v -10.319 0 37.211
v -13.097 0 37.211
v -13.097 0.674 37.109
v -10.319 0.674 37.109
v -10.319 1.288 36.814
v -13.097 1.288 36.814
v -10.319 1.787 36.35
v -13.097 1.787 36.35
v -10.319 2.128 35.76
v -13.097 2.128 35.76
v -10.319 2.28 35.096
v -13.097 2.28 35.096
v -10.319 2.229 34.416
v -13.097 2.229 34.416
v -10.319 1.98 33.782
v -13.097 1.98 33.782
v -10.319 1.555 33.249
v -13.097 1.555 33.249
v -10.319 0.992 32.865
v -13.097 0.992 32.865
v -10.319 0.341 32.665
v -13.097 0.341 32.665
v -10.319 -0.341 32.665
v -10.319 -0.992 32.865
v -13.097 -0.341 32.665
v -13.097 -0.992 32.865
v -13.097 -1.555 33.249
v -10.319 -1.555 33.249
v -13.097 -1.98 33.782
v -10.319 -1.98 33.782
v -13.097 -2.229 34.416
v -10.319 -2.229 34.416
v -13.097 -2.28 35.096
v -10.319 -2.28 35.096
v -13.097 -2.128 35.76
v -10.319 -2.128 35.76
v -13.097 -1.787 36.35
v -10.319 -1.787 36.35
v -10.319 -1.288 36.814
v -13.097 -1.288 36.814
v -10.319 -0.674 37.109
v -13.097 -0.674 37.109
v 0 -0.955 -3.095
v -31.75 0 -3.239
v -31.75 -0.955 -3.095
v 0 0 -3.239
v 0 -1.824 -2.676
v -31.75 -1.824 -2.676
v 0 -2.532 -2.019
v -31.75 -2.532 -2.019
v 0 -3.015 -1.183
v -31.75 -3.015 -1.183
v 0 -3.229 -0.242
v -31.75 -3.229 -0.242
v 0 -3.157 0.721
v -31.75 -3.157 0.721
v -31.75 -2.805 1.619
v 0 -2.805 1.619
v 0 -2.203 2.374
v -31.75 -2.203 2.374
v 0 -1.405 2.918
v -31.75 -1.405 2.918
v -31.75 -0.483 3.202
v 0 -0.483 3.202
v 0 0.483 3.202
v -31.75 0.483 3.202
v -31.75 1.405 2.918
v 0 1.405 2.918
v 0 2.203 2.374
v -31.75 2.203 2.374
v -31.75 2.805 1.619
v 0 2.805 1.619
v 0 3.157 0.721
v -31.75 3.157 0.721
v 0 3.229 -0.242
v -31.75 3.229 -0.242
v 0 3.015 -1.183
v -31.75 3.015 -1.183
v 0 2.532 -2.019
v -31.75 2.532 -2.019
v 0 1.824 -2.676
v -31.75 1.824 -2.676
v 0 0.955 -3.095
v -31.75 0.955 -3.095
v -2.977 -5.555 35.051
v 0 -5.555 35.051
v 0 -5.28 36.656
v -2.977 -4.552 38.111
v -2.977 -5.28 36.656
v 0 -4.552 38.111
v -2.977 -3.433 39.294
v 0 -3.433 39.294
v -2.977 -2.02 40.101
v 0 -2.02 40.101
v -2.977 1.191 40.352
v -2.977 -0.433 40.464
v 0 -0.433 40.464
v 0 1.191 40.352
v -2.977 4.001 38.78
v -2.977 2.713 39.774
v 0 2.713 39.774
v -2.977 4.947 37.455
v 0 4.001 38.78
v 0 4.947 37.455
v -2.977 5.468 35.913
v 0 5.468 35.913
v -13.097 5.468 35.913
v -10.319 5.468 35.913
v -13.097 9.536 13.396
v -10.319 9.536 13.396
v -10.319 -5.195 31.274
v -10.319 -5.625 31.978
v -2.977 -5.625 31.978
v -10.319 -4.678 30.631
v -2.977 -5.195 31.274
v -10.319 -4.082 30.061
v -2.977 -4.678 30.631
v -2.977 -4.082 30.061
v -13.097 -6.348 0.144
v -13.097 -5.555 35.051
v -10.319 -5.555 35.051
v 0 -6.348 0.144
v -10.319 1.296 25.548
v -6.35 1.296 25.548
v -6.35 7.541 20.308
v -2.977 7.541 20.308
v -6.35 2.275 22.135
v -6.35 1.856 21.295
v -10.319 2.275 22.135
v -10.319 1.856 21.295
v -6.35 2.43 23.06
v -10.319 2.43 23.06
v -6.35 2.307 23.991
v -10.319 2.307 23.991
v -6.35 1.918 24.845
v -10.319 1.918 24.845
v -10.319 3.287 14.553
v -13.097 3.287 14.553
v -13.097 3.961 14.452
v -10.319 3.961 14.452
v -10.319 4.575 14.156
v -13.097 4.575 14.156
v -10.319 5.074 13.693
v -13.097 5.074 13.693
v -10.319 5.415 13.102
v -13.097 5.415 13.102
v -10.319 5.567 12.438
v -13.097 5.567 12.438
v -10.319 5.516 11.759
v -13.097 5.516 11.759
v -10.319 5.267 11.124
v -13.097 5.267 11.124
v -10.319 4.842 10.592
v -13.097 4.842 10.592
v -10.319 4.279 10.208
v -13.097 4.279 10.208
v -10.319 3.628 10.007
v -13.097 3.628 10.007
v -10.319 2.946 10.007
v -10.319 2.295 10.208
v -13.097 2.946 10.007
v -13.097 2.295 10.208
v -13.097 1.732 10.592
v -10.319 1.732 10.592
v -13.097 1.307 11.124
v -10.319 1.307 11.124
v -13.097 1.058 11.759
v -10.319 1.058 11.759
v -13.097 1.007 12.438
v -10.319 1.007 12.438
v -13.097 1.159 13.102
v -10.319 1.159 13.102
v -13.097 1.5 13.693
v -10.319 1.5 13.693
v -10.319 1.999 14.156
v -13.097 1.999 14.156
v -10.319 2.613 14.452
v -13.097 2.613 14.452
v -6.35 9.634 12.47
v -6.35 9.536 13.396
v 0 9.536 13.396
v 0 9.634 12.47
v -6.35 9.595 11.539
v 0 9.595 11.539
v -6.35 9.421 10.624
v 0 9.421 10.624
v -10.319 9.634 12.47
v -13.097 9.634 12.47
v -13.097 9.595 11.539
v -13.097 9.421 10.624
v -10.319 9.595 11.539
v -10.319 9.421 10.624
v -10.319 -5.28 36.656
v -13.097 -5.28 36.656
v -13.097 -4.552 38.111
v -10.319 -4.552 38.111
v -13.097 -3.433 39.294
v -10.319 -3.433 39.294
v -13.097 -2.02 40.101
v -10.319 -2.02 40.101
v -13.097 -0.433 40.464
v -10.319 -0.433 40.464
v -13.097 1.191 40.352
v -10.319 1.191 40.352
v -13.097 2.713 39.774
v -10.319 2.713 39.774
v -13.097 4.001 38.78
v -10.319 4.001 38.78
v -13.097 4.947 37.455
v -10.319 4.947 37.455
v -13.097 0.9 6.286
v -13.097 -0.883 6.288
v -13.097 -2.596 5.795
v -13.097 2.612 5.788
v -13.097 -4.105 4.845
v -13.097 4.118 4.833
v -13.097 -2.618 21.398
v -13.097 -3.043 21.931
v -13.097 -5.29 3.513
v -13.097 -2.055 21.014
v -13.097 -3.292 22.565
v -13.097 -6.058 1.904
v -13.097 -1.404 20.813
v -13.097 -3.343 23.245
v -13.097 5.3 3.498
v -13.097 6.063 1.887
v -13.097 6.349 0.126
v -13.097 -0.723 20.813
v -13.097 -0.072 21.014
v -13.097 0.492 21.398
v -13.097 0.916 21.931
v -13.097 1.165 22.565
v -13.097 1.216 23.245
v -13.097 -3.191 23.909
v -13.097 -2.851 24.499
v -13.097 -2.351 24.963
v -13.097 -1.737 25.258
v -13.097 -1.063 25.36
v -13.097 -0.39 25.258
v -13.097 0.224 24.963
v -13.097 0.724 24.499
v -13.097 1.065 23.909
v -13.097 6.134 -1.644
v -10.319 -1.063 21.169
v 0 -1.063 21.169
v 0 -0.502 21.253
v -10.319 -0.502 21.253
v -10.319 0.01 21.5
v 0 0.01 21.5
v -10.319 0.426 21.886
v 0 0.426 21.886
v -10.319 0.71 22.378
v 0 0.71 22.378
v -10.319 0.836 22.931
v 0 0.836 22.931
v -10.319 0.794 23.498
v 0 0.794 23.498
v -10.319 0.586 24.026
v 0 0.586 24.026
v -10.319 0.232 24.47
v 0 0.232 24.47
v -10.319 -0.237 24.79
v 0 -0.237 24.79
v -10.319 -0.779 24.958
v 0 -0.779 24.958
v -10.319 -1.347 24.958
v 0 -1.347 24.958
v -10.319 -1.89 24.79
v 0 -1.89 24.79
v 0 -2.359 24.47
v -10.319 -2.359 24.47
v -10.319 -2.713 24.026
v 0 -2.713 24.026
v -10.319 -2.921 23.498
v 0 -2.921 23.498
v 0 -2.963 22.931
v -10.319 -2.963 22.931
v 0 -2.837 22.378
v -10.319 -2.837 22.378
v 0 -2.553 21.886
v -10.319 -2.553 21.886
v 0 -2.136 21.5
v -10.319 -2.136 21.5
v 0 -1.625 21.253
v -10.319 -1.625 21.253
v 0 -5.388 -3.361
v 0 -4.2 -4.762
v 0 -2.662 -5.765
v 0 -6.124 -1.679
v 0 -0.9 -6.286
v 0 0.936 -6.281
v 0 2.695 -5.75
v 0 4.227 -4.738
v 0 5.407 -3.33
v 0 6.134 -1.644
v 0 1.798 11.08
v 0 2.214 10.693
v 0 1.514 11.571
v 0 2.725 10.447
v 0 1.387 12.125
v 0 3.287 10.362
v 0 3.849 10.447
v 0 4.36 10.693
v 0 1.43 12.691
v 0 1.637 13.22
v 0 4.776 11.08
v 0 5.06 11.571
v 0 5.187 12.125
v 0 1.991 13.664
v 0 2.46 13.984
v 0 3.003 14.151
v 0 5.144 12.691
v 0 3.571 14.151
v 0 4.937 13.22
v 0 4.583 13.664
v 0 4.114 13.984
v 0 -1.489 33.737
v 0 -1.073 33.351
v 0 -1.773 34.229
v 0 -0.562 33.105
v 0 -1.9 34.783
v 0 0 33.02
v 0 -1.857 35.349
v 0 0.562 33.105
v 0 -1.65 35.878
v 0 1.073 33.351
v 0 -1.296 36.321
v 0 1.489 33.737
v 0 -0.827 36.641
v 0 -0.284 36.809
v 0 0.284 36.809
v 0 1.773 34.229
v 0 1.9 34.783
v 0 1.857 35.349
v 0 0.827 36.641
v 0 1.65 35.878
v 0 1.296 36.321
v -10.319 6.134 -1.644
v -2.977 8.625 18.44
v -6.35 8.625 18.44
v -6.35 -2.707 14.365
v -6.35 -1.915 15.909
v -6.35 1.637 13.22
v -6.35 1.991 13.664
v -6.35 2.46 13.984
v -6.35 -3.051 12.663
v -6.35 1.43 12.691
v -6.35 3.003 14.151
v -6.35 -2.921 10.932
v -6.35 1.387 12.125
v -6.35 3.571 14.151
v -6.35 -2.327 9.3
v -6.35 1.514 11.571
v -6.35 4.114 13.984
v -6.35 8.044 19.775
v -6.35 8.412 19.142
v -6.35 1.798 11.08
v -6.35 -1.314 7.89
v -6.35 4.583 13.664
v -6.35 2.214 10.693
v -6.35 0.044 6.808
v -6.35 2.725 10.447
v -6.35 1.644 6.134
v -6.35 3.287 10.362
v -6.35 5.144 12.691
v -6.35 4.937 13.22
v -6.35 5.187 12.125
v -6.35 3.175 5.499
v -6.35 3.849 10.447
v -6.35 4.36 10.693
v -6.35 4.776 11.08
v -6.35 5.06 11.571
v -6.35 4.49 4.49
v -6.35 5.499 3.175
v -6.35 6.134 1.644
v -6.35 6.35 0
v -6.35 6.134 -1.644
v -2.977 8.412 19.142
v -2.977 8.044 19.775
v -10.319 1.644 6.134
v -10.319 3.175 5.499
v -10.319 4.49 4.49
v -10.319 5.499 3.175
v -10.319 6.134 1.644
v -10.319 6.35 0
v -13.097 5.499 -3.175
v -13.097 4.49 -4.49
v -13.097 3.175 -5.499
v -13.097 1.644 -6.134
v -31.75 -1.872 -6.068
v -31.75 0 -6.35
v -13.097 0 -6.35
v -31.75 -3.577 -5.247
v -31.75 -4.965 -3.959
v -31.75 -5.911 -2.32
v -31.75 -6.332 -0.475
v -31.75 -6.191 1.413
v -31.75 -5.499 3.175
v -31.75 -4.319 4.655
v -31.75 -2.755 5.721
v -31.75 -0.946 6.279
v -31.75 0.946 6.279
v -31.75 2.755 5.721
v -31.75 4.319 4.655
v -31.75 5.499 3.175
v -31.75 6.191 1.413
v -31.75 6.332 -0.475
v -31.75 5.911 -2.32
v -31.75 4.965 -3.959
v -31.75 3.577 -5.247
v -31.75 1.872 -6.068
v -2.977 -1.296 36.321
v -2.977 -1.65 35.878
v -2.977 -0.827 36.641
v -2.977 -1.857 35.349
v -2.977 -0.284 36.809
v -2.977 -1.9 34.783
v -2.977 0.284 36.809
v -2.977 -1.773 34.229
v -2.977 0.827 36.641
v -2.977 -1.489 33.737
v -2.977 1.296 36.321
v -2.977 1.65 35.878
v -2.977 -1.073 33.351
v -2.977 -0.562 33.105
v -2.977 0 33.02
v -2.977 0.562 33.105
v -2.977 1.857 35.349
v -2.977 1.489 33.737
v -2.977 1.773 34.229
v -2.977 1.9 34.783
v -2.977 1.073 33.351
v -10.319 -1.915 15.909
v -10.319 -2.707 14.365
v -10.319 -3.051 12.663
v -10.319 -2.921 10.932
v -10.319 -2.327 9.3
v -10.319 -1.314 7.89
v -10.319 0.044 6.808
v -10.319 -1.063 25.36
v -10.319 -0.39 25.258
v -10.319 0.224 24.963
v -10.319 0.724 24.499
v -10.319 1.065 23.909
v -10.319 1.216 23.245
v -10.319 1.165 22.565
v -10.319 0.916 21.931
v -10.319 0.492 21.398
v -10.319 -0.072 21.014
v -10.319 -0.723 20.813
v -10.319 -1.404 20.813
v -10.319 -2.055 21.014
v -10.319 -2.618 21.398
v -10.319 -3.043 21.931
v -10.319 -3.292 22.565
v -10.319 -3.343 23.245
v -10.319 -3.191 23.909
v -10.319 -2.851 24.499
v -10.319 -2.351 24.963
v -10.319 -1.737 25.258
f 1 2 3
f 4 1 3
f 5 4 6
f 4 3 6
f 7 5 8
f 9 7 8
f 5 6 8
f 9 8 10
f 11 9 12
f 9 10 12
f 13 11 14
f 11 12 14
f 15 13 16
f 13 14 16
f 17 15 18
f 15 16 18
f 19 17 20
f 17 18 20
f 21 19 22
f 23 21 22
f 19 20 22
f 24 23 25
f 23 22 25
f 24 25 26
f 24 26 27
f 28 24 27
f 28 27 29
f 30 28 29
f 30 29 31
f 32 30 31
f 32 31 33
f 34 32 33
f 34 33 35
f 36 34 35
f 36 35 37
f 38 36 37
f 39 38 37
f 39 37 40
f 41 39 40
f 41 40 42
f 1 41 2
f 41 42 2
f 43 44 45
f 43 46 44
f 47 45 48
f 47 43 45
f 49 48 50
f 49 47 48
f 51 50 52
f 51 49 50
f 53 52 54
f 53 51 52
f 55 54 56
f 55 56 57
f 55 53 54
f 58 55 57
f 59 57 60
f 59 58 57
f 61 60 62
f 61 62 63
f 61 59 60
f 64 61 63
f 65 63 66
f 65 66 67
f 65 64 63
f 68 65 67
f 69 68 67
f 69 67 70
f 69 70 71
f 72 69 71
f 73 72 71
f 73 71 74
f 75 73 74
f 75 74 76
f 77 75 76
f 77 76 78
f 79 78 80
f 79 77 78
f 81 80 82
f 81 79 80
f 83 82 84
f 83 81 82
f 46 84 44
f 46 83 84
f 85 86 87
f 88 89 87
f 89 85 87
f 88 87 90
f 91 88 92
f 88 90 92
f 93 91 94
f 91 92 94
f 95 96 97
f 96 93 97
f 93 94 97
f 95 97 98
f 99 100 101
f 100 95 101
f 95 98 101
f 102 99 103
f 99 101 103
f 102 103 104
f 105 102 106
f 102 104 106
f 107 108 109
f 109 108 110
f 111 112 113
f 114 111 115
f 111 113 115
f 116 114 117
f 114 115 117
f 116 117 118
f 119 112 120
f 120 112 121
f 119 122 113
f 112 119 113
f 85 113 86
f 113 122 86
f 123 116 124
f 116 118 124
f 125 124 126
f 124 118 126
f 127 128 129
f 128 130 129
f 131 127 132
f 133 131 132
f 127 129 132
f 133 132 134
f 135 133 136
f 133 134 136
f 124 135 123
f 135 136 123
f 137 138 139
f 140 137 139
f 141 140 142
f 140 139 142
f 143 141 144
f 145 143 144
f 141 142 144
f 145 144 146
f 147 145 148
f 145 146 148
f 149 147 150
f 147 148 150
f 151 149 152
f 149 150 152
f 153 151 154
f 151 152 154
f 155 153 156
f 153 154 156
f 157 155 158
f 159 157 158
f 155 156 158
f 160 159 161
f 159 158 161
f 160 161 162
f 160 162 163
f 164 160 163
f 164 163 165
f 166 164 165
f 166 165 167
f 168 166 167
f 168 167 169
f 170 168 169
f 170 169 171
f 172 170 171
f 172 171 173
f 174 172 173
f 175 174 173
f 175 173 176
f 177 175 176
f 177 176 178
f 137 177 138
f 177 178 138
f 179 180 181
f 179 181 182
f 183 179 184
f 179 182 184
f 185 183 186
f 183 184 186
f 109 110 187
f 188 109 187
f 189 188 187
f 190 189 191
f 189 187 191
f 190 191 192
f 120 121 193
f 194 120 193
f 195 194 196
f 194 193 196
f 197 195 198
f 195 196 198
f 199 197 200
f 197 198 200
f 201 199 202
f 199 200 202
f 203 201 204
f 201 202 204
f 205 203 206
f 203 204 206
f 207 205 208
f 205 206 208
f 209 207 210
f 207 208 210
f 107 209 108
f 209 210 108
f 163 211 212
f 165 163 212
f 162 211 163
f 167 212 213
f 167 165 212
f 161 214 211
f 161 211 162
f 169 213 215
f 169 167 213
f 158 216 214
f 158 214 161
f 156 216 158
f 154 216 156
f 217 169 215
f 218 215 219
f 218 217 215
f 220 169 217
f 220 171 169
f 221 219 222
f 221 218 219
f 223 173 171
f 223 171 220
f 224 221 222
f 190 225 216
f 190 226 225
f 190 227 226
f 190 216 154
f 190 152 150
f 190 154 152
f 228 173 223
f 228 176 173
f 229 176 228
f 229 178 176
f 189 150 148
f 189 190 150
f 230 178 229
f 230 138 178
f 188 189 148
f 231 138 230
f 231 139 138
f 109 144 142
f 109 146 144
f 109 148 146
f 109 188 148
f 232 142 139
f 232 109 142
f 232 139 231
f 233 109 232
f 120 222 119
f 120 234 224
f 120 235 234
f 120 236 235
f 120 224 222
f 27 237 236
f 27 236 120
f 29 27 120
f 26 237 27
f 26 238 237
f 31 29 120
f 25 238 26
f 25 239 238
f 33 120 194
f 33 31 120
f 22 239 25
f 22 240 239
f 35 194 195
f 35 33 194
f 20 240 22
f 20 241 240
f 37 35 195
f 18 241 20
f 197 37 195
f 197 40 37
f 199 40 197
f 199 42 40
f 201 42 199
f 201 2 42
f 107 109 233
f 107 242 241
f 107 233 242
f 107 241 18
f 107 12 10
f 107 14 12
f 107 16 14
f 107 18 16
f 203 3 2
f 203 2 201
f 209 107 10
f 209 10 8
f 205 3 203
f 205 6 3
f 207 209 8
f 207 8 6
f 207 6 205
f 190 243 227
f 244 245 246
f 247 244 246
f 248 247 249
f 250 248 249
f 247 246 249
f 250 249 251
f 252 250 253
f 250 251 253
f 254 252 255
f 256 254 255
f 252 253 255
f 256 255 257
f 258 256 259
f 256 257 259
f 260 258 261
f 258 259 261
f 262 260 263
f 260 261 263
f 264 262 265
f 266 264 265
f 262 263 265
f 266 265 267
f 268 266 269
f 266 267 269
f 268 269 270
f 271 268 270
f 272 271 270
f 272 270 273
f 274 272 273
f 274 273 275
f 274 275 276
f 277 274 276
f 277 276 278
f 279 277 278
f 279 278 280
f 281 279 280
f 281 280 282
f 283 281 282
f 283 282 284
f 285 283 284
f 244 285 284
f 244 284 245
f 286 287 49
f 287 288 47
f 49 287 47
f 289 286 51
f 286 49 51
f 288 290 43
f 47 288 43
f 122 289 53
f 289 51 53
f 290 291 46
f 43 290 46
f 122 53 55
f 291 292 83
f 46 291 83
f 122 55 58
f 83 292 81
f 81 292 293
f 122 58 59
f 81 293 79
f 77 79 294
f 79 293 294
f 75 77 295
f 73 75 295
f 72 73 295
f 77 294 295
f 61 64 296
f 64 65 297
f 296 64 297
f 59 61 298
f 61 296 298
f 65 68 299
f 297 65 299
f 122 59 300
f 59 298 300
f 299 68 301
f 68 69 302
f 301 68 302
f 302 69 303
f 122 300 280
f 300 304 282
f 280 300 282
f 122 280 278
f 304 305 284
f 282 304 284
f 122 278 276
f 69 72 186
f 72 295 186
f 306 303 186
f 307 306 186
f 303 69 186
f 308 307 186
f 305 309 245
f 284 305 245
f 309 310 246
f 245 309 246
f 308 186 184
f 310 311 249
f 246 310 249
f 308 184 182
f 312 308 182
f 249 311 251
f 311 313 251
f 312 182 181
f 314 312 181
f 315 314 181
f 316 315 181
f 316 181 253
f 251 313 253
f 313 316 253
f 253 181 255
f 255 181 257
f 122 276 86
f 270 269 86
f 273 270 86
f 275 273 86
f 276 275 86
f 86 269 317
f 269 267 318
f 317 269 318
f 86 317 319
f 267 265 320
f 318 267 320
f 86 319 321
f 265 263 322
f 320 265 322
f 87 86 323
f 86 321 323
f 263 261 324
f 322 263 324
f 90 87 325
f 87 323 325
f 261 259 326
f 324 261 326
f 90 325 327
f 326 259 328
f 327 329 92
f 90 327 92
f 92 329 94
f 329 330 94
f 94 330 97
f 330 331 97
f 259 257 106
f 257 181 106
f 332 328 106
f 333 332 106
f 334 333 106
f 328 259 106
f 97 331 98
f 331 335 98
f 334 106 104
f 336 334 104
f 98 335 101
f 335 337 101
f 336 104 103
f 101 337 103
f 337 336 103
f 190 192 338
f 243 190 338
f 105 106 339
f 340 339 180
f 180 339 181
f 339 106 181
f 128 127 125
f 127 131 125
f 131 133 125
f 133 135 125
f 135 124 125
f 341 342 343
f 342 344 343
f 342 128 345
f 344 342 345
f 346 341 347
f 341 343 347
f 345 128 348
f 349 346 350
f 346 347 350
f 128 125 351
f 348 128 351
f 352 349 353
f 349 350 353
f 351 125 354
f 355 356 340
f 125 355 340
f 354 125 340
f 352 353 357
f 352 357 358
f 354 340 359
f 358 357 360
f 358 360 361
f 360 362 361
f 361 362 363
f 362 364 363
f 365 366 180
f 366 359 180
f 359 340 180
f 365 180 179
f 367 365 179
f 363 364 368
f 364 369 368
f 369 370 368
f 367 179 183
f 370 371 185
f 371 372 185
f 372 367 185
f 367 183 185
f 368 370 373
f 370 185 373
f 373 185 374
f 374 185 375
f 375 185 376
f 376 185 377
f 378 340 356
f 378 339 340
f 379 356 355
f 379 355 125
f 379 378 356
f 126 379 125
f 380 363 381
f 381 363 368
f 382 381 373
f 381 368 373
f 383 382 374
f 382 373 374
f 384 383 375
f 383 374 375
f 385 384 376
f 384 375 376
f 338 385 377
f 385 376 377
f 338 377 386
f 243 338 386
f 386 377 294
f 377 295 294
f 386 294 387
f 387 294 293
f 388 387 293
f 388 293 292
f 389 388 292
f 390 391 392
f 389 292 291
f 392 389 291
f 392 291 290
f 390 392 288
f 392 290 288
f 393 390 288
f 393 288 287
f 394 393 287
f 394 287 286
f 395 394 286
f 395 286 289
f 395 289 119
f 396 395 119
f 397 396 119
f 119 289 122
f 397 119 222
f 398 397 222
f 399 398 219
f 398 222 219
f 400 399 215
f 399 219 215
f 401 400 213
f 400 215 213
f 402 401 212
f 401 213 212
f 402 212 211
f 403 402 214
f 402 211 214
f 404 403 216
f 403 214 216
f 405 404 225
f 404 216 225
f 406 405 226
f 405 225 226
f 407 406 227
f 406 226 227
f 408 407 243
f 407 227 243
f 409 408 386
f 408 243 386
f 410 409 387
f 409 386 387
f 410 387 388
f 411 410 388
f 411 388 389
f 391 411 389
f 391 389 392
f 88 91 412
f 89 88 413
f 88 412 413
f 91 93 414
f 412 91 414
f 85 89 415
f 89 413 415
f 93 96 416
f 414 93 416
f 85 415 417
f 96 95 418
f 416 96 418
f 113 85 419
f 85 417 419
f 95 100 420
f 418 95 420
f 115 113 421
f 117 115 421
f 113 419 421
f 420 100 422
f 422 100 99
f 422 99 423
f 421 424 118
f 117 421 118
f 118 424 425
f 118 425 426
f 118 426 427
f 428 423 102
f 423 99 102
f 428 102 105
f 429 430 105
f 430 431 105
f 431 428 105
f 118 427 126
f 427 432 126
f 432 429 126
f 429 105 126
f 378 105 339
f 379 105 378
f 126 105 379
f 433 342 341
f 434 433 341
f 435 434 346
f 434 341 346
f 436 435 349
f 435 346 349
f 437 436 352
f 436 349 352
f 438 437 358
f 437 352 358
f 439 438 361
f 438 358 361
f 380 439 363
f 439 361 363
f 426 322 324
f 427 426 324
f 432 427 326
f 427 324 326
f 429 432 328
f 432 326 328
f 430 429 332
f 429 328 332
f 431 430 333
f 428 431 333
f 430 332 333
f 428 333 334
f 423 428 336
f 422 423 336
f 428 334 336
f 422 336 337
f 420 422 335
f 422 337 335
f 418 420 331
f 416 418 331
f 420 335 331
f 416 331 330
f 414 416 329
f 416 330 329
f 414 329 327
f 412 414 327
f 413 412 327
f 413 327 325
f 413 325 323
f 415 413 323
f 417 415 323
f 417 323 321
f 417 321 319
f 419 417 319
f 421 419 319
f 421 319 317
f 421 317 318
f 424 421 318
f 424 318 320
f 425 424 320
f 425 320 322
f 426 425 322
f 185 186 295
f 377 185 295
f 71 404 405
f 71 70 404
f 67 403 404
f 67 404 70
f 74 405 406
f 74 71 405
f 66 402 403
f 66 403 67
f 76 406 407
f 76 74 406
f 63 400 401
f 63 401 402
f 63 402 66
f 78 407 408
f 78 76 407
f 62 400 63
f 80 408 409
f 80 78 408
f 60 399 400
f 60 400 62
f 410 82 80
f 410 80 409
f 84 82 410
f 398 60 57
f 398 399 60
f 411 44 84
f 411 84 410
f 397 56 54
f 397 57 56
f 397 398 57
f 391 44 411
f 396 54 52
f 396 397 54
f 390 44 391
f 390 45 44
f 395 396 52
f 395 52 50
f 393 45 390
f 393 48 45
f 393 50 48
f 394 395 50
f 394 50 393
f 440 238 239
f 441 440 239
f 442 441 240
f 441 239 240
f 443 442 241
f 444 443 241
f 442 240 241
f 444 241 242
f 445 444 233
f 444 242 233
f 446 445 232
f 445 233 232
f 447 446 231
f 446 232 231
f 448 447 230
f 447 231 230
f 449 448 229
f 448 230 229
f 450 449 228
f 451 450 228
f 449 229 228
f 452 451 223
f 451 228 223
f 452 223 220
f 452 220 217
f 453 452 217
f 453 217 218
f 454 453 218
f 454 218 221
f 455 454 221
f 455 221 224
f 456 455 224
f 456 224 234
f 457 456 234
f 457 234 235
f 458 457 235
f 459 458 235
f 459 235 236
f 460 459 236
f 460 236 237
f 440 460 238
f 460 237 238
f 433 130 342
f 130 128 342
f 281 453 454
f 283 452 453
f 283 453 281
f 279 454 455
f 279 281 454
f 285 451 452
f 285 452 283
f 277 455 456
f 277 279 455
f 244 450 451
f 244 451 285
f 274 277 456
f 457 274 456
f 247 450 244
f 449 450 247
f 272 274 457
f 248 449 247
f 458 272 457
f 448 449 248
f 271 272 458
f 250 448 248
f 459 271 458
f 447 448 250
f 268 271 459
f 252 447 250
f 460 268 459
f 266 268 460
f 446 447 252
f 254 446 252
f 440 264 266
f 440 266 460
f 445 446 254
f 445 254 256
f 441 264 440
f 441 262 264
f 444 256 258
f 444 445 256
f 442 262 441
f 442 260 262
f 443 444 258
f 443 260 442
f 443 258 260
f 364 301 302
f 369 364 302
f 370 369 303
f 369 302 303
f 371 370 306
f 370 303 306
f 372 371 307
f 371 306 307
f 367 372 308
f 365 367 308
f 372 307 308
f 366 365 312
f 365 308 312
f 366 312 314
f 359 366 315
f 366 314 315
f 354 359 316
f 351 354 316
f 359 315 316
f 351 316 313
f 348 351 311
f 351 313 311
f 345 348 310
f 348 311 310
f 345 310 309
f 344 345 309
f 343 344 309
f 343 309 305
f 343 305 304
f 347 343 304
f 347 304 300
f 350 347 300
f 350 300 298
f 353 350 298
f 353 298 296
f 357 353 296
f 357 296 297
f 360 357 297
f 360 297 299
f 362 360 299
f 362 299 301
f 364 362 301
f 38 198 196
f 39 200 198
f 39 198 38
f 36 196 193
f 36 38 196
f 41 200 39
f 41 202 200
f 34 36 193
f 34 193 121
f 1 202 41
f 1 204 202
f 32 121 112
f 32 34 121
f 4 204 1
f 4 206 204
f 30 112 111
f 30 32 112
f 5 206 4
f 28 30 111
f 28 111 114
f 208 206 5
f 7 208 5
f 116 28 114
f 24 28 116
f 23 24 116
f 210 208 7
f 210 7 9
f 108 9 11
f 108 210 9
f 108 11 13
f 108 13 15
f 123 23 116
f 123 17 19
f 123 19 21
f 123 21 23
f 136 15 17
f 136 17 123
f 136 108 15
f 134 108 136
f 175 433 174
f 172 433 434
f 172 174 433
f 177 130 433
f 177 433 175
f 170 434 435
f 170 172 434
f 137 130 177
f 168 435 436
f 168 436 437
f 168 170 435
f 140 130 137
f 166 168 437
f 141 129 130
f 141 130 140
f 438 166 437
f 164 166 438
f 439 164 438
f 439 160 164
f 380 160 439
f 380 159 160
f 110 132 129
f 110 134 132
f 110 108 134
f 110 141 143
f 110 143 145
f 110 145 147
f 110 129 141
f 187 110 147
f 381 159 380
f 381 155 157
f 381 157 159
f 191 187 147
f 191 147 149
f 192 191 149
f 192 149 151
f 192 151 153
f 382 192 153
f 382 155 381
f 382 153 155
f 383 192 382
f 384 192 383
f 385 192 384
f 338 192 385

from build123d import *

# Parameters (mm, degrees)
BOSS_EXTRUDE1_DEPTH = 13.096874999999999
CUT_EXTRUDE4_START  = -6.35
CUT_EXTRUDE4_DEPTH  = 3.96875
CUT_EXTRUDE6_DEPTH  = 3.571875
SKETCH3_R           = 3.2385000000000006
SKETCH3_R_2         = 1.9049999999999998
SKETCH3_R_3         = 1.905
SKETCH3_R_4         = 1.9050000000000002
CUT_EXTRUDE2_DEPTH  = 44.62489589012807
SKETCH4_R           = 6.349999999999998
SKETCH4_R_2         = 3.2385000000000006
BOSS_EXTRUDE2_DEPTH = 18.653125
SKETCH5_R           = 2.286
SKETCH5_R_2         = 2.285999999999998
SKETCH5_R_3         = 2.2859999999999947
CUT_EXTRUDE5_DEPTH  = 2.778125
FILLET1_R           = 3.175


with BuildPart() as part:
    # Sketch1 → Boss-Extrude1 (new body)
    with BuildSketch(Plane(origin=(0, 0, 0), x_dir=(0, 0, -1), z_dir=(1, 0, 0))):
        with BuildLine():
            Line((-0.144318181818181, -6.348359808832252), (-35.051278409090905, -5.55481483272822))
            ThreePointArc((-35.051278409090905, -5.55481483272822), (-40.46435346310375, -0.4329864585648121), (-35.912861193635386, 5.467727528380438))
            Line((-35.912861193635386, 5.467727528380438), (-13.396242215168781, 9.535833333808146))
            ThreePointArc((-13.396242215168781, 9.535833333808146), (-12.00362991406523, 9.631527090305429), (-10.623757057470224, 9.420630869737527))
            Line((-10.623757057470224, 9.420630869737527), (1.643500936400966, 6.133628996935595))
            ThreePointArc((1.643500936400966, 6.133628996935595), (6.285849057186948, -0.9003341769931446), (-0.144318181818181, -6.348359808832252))
        make_face()
    extrude(amount=-BOSS_EXTRUDE1_DEPTH)

    # Sketch6 → Cut-Extrude4 (cut)
    with BuildSketch(Plane(origin=(0, 0, 0), x_dir=(0, 0, -1), z_dir=(1, 0, 0)).offset(CUT_EXTRUDE4_START)):
        with BuildLine():
            Line((1.643500936400966, 6.133628996935595), (-10.623757057470224, 9.420630869737526))
            ThreePointArc((-10.623757057470224, 9.420630869737526), (-12.00362991406523, 9.63152709030543), (-13.396242215168781, 9.535833333808146))
            Line((-13.396242215168781, 9.535833333808146), (-35.912861193635386, 5.467727528380437))
            ThreePointArc((-35.912861193635386, 5.467727528380437), (-40.46435346310375, -0.4329864585648108), (-35.051278409090905, -5.55481483272822))
            Line((-35.051278409090905, -5.55481483272822), (-31.977891932173424, -5.6246825720703155))
            ThreePointArc((-31.977891932173424, -5.6246825720703155), (-30.943788765977928, -4.9469644338822985), (-30.060617786194513, -4.081701321509548))
            Line((-30.060617786194513, -4.081701321509548), (-23.677913080624045, 3.524909941821936))
            Line((-23.677913080624045, 3.524909941821936), (-15.9094683647003, -1.9146136084331862))
            ThreePointArc((-15.9094683647003, -1.9146136084331862), (-10.095430083753156, -2.6800462691885727), (-6.133628996935595, 1.643500936400966))
            ThreePointArc((-6.133628996935595, 1.643500936400966), (-3.1750000000000385, 5.4992613140311635), (1.643500936400966, 6.133628996935595))
        make_face()
    extrude(amount=-CUT_EXTRUDE4_DEPTH, mode=Mode.SUBTRACT)

    # Sketch7 → Cut-Extrude6 (cut, symmetric)
    with BuildSketch(Plane(origin=(-6.5484374999999995, 0, 0), x_dir=(0, 0, -1), z_dir=(1, 0, 0))):
        with BuildLine():
            Line((-30.06061778619451, -4.0817013215095495), (-19.57011605971736, 8.420391799135219))
            Line((-19.57011605971736, 8.420391799135219), (-35.912861193635386, 5.467727528380437))
            ThreePointArc((-35.912861193635386, 5.467727528380437), (-40.46435346310375, -0.4329864585648108), (-35.051278409090905, -5.55481483272822))
            Line((-35.051278409090905, -5.55481483272822), (-31.977891932173424, -5.6246825720703155))
            ThreePointArc((-31.977891932173424, -5.6246825720703155), (-30.943788765977924, -4.946964433882303), (-30.06061778619451, -4.0817013215095495))
        make_face()
    extrude(amount=CUT_EXTRUDE6_DEPTH, both=True, mode=Mode.SUBTRACT)

    # Sketch3 → Cut-Extrude2 (cut, through all)
    with BuildSketch(Plane(origin=(0, 0, 0), x_dir=(0, 0, -1), z_dir=(1, 0, 0))):
        Circle(SKETCH3_R)
        with Locations((-34.925, 0)):
            Circle(SKETCH3_R_2)
        with Locations((-12.26725799387119, 3.287001872801932)):
            Circle(SKETCH3_R_3)
        with Locations((-23.07385471451217, -1.0633688768983705)):
            Circle(SKETCH3_R_4)
    extrude(amount=-CUT_EXTRUDE2_DEPTH, mode=Mode.SUBTRACT)

    # Sketch4 → Boss-Extrude2 (add)
    with BuildSketch(Plane.ZY.offset(13.096874999999999)):
        with Locations(Location((0, 0, 0), (0, 0, 180))):
            Circle(SKETCH4_R)
        with Locations(Location((0, 0, 0), (0, 0, 180))):
            Circle(SKETCH4_R_2, mode=Mode.SUBTRACT)
    extrude(amount=BOSS_EXTRUDE2_DEPTH)

    # Sketch5 → Cut-Extrude5 (cut)
    with BuildSketch(Plane.ZY.offset(13.096874999999999)):
        with Locations((12.26725799387119, 3.287001872801932)):
            Circle(SKETCH5_R)
        with Locations((23.07385471451217, -1.0633688768983705)):
            Circle(SKETCH5_R_2)
        with Locations((34.925, 0)):
            Circle(SKETCH5_R_3)
    extrude(amount=-CUT_EXTRUDE5_DEPTH, mode=Mode.SUBTRACT)

    # Fillet1
    fillet1_edges = [part.edges().sort_by_distance(p)[0] for p in [
        (-8.334375, 3.524909941821936, 23.677913080624045),
        (-4.66328125, 8.420391799135219, 19.57011605971736),
    ]]
    fillet(fillet1_edges, radius=FILLET1_R)


solid = part.part
